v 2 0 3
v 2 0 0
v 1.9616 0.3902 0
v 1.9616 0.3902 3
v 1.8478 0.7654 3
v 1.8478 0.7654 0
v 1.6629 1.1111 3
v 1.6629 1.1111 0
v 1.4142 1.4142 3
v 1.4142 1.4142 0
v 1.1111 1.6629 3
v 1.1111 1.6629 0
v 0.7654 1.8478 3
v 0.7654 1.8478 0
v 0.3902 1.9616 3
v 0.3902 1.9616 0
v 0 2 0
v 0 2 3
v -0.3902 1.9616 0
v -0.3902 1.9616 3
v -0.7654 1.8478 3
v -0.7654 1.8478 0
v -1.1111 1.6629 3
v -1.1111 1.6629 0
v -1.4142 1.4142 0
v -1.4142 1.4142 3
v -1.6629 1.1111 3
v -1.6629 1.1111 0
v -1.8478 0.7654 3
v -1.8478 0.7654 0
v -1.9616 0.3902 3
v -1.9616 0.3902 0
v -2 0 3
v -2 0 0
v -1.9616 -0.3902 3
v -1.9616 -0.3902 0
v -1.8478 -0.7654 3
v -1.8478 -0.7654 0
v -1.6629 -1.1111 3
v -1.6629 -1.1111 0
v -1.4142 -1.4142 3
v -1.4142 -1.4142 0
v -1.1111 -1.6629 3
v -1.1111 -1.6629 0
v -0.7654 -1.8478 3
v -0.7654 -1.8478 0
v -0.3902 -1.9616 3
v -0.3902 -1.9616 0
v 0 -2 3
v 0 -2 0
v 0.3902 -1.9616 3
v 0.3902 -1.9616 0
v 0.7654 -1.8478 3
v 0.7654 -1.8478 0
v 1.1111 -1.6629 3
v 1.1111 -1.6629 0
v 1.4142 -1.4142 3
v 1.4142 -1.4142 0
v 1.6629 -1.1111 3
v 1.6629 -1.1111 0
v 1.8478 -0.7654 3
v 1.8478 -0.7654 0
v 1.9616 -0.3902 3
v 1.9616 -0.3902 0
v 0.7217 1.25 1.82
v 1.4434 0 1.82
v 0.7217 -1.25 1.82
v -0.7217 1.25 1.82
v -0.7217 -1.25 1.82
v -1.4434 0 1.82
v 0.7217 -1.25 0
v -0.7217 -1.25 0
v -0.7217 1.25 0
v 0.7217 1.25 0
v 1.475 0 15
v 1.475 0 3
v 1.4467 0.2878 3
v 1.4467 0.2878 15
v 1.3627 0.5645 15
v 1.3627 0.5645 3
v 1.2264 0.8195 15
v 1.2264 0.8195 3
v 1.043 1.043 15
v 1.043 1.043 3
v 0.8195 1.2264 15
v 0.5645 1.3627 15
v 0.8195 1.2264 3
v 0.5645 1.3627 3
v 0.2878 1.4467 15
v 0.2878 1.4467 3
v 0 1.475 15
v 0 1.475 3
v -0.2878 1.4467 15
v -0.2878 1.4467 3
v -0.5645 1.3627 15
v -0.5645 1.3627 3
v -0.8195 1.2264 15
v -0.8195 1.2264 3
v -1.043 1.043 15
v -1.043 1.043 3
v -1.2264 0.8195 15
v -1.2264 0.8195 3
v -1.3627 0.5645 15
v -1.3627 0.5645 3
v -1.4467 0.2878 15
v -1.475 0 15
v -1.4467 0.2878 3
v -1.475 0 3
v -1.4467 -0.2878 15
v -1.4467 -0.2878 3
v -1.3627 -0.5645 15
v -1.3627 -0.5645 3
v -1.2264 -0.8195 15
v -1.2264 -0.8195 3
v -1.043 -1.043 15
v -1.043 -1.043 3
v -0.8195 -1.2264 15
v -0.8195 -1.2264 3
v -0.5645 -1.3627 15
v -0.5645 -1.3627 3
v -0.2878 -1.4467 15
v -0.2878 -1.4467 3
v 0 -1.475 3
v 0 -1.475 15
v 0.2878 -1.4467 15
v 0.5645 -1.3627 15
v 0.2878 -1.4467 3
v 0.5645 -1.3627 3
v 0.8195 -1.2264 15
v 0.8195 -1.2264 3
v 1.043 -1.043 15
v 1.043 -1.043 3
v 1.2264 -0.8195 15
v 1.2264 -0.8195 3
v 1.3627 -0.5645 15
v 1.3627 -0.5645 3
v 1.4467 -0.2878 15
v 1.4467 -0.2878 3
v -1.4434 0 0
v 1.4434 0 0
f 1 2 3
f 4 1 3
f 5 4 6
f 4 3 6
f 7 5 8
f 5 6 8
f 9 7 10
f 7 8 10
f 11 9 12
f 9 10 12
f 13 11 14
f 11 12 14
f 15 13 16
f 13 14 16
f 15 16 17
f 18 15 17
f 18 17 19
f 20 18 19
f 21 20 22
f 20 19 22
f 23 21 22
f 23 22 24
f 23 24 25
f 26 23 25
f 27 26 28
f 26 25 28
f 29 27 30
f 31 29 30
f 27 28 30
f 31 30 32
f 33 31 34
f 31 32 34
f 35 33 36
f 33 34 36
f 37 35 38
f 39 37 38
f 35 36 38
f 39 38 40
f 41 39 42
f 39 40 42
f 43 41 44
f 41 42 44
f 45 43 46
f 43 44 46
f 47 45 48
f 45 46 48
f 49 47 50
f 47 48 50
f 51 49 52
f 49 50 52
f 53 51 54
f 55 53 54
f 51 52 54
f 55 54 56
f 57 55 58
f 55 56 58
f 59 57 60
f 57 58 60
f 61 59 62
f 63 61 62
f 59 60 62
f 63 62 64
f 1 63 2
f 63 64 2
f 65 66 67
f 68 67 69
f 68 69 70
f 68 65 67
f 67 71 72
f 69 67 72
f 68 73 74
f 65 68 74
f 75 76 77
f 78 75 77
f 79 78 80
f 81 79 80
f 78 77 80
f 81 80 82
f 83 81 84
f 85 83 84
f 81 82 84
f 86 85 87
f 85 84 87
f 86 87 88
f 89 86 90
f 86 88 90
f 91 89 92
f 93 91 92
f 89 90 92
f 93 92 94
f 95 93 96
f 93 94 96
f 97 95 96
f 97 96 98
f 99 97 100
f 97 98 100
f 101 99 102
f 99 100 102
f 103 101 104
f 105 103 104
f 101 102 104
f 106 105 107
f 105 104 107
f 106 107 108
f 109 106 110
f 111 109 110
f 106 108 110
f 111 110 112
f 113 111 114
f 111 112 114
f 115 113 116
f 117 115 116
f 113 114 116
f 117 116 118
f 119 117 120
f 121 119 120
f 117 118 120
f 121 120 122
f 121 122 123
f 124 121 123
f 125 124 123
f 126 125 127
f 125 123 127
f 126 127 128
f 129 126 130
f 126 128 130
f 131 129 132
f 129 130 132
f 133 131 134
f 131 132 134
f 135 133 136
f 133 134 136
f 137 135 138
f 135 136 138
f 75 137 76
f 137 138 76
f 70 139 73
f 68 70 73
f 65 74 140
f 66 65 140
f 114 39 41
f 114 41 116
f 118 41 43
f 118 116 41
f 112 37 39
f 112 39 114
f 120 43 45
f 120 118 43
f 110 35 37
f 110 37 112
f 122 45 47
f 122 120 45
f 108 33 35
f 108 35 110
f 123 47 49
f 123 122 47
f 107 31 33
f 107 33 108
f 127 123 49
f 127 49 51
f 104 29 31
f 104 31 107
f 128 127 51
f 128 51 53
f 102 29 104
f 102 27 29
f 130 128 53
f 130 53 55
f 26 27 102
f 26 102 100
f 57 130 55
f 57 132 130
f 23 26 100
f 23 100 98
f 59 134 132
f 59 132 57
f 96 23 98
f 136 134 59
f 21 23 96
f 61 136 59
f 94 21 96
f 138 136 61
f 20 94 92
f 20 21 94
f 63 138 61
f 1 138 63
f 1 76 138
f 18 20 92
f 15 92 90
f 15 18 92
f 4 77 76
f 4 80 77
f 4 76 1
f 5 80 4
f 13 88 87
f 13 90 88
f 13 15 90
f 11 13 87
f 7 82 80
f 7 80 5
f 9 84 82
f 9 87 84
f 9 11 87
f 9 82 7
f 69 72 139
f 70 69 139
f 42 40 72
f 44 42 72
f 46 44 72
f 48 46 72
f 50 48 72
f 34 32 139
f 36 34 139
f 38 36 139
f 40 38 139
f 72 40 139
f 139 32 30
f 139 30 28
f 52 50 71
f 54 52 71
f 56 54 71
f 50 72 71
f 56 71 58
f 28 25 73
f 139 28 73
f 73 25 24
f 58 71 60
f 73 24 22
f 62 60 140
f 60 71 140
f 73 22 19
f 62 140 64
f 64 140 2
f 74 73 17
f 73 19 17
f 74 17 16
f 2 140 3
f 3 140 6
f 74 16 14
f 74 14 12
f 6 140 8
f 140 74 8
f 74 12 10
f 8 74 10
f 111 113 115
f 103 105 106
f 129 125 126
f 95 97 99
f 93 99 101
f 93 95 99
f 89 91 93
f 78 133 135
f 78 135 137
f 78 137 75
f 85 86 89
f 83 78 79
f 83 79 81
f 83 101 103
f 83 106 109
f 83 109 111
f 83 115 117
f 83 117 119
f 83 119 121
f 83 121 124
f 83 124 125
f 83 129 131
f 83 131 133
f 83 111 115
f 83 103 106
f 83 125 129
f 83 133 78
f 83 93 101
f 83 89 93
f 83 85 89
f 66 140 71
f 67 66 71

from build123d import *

# Parameters (mm, degrees)
SKETCH1_R      = 2
EXTRUDE1_DEPTH = 3
EXTRUDE3_DEPTH = 1.82
SKETCH2_R      = 1.475
EXTRUDE2_DEPTH = 12


with BuildPart() as part:
    # Sketch1 → Extrude1 (new body)
    with BuildSketch(Plane.XY):
        Circle(SKETCH1_R)
    extrude(amount=EXTRUDE1_DEPTH)

    # Sketch3 → Extrude3 (cut)
    with BuildSketch(Plane(origin=(0, 0, 0), x_dir=(-1, 0, 0), z_dir=(0, 0, -1))):
        Polygon((-1.443375673, 0), (-0.721687836, -1.25), (0.721687836, -1.25), (1.443375673, 0), (0.721687836, 1.25), (-0.721687836, 1.25), align=None)
    extrude(amount=-EXTRUDE3_DEPTH, mode=Mode.SUBTRACT)

    # Sketch2 → Extrude2 (add)
    with BuildSketch(Plane.XY.offset(3)):
        Circle(SKETCH2_R)
    extrude(amount=EXTRUDE2_DEPTH)


solid = part.part
